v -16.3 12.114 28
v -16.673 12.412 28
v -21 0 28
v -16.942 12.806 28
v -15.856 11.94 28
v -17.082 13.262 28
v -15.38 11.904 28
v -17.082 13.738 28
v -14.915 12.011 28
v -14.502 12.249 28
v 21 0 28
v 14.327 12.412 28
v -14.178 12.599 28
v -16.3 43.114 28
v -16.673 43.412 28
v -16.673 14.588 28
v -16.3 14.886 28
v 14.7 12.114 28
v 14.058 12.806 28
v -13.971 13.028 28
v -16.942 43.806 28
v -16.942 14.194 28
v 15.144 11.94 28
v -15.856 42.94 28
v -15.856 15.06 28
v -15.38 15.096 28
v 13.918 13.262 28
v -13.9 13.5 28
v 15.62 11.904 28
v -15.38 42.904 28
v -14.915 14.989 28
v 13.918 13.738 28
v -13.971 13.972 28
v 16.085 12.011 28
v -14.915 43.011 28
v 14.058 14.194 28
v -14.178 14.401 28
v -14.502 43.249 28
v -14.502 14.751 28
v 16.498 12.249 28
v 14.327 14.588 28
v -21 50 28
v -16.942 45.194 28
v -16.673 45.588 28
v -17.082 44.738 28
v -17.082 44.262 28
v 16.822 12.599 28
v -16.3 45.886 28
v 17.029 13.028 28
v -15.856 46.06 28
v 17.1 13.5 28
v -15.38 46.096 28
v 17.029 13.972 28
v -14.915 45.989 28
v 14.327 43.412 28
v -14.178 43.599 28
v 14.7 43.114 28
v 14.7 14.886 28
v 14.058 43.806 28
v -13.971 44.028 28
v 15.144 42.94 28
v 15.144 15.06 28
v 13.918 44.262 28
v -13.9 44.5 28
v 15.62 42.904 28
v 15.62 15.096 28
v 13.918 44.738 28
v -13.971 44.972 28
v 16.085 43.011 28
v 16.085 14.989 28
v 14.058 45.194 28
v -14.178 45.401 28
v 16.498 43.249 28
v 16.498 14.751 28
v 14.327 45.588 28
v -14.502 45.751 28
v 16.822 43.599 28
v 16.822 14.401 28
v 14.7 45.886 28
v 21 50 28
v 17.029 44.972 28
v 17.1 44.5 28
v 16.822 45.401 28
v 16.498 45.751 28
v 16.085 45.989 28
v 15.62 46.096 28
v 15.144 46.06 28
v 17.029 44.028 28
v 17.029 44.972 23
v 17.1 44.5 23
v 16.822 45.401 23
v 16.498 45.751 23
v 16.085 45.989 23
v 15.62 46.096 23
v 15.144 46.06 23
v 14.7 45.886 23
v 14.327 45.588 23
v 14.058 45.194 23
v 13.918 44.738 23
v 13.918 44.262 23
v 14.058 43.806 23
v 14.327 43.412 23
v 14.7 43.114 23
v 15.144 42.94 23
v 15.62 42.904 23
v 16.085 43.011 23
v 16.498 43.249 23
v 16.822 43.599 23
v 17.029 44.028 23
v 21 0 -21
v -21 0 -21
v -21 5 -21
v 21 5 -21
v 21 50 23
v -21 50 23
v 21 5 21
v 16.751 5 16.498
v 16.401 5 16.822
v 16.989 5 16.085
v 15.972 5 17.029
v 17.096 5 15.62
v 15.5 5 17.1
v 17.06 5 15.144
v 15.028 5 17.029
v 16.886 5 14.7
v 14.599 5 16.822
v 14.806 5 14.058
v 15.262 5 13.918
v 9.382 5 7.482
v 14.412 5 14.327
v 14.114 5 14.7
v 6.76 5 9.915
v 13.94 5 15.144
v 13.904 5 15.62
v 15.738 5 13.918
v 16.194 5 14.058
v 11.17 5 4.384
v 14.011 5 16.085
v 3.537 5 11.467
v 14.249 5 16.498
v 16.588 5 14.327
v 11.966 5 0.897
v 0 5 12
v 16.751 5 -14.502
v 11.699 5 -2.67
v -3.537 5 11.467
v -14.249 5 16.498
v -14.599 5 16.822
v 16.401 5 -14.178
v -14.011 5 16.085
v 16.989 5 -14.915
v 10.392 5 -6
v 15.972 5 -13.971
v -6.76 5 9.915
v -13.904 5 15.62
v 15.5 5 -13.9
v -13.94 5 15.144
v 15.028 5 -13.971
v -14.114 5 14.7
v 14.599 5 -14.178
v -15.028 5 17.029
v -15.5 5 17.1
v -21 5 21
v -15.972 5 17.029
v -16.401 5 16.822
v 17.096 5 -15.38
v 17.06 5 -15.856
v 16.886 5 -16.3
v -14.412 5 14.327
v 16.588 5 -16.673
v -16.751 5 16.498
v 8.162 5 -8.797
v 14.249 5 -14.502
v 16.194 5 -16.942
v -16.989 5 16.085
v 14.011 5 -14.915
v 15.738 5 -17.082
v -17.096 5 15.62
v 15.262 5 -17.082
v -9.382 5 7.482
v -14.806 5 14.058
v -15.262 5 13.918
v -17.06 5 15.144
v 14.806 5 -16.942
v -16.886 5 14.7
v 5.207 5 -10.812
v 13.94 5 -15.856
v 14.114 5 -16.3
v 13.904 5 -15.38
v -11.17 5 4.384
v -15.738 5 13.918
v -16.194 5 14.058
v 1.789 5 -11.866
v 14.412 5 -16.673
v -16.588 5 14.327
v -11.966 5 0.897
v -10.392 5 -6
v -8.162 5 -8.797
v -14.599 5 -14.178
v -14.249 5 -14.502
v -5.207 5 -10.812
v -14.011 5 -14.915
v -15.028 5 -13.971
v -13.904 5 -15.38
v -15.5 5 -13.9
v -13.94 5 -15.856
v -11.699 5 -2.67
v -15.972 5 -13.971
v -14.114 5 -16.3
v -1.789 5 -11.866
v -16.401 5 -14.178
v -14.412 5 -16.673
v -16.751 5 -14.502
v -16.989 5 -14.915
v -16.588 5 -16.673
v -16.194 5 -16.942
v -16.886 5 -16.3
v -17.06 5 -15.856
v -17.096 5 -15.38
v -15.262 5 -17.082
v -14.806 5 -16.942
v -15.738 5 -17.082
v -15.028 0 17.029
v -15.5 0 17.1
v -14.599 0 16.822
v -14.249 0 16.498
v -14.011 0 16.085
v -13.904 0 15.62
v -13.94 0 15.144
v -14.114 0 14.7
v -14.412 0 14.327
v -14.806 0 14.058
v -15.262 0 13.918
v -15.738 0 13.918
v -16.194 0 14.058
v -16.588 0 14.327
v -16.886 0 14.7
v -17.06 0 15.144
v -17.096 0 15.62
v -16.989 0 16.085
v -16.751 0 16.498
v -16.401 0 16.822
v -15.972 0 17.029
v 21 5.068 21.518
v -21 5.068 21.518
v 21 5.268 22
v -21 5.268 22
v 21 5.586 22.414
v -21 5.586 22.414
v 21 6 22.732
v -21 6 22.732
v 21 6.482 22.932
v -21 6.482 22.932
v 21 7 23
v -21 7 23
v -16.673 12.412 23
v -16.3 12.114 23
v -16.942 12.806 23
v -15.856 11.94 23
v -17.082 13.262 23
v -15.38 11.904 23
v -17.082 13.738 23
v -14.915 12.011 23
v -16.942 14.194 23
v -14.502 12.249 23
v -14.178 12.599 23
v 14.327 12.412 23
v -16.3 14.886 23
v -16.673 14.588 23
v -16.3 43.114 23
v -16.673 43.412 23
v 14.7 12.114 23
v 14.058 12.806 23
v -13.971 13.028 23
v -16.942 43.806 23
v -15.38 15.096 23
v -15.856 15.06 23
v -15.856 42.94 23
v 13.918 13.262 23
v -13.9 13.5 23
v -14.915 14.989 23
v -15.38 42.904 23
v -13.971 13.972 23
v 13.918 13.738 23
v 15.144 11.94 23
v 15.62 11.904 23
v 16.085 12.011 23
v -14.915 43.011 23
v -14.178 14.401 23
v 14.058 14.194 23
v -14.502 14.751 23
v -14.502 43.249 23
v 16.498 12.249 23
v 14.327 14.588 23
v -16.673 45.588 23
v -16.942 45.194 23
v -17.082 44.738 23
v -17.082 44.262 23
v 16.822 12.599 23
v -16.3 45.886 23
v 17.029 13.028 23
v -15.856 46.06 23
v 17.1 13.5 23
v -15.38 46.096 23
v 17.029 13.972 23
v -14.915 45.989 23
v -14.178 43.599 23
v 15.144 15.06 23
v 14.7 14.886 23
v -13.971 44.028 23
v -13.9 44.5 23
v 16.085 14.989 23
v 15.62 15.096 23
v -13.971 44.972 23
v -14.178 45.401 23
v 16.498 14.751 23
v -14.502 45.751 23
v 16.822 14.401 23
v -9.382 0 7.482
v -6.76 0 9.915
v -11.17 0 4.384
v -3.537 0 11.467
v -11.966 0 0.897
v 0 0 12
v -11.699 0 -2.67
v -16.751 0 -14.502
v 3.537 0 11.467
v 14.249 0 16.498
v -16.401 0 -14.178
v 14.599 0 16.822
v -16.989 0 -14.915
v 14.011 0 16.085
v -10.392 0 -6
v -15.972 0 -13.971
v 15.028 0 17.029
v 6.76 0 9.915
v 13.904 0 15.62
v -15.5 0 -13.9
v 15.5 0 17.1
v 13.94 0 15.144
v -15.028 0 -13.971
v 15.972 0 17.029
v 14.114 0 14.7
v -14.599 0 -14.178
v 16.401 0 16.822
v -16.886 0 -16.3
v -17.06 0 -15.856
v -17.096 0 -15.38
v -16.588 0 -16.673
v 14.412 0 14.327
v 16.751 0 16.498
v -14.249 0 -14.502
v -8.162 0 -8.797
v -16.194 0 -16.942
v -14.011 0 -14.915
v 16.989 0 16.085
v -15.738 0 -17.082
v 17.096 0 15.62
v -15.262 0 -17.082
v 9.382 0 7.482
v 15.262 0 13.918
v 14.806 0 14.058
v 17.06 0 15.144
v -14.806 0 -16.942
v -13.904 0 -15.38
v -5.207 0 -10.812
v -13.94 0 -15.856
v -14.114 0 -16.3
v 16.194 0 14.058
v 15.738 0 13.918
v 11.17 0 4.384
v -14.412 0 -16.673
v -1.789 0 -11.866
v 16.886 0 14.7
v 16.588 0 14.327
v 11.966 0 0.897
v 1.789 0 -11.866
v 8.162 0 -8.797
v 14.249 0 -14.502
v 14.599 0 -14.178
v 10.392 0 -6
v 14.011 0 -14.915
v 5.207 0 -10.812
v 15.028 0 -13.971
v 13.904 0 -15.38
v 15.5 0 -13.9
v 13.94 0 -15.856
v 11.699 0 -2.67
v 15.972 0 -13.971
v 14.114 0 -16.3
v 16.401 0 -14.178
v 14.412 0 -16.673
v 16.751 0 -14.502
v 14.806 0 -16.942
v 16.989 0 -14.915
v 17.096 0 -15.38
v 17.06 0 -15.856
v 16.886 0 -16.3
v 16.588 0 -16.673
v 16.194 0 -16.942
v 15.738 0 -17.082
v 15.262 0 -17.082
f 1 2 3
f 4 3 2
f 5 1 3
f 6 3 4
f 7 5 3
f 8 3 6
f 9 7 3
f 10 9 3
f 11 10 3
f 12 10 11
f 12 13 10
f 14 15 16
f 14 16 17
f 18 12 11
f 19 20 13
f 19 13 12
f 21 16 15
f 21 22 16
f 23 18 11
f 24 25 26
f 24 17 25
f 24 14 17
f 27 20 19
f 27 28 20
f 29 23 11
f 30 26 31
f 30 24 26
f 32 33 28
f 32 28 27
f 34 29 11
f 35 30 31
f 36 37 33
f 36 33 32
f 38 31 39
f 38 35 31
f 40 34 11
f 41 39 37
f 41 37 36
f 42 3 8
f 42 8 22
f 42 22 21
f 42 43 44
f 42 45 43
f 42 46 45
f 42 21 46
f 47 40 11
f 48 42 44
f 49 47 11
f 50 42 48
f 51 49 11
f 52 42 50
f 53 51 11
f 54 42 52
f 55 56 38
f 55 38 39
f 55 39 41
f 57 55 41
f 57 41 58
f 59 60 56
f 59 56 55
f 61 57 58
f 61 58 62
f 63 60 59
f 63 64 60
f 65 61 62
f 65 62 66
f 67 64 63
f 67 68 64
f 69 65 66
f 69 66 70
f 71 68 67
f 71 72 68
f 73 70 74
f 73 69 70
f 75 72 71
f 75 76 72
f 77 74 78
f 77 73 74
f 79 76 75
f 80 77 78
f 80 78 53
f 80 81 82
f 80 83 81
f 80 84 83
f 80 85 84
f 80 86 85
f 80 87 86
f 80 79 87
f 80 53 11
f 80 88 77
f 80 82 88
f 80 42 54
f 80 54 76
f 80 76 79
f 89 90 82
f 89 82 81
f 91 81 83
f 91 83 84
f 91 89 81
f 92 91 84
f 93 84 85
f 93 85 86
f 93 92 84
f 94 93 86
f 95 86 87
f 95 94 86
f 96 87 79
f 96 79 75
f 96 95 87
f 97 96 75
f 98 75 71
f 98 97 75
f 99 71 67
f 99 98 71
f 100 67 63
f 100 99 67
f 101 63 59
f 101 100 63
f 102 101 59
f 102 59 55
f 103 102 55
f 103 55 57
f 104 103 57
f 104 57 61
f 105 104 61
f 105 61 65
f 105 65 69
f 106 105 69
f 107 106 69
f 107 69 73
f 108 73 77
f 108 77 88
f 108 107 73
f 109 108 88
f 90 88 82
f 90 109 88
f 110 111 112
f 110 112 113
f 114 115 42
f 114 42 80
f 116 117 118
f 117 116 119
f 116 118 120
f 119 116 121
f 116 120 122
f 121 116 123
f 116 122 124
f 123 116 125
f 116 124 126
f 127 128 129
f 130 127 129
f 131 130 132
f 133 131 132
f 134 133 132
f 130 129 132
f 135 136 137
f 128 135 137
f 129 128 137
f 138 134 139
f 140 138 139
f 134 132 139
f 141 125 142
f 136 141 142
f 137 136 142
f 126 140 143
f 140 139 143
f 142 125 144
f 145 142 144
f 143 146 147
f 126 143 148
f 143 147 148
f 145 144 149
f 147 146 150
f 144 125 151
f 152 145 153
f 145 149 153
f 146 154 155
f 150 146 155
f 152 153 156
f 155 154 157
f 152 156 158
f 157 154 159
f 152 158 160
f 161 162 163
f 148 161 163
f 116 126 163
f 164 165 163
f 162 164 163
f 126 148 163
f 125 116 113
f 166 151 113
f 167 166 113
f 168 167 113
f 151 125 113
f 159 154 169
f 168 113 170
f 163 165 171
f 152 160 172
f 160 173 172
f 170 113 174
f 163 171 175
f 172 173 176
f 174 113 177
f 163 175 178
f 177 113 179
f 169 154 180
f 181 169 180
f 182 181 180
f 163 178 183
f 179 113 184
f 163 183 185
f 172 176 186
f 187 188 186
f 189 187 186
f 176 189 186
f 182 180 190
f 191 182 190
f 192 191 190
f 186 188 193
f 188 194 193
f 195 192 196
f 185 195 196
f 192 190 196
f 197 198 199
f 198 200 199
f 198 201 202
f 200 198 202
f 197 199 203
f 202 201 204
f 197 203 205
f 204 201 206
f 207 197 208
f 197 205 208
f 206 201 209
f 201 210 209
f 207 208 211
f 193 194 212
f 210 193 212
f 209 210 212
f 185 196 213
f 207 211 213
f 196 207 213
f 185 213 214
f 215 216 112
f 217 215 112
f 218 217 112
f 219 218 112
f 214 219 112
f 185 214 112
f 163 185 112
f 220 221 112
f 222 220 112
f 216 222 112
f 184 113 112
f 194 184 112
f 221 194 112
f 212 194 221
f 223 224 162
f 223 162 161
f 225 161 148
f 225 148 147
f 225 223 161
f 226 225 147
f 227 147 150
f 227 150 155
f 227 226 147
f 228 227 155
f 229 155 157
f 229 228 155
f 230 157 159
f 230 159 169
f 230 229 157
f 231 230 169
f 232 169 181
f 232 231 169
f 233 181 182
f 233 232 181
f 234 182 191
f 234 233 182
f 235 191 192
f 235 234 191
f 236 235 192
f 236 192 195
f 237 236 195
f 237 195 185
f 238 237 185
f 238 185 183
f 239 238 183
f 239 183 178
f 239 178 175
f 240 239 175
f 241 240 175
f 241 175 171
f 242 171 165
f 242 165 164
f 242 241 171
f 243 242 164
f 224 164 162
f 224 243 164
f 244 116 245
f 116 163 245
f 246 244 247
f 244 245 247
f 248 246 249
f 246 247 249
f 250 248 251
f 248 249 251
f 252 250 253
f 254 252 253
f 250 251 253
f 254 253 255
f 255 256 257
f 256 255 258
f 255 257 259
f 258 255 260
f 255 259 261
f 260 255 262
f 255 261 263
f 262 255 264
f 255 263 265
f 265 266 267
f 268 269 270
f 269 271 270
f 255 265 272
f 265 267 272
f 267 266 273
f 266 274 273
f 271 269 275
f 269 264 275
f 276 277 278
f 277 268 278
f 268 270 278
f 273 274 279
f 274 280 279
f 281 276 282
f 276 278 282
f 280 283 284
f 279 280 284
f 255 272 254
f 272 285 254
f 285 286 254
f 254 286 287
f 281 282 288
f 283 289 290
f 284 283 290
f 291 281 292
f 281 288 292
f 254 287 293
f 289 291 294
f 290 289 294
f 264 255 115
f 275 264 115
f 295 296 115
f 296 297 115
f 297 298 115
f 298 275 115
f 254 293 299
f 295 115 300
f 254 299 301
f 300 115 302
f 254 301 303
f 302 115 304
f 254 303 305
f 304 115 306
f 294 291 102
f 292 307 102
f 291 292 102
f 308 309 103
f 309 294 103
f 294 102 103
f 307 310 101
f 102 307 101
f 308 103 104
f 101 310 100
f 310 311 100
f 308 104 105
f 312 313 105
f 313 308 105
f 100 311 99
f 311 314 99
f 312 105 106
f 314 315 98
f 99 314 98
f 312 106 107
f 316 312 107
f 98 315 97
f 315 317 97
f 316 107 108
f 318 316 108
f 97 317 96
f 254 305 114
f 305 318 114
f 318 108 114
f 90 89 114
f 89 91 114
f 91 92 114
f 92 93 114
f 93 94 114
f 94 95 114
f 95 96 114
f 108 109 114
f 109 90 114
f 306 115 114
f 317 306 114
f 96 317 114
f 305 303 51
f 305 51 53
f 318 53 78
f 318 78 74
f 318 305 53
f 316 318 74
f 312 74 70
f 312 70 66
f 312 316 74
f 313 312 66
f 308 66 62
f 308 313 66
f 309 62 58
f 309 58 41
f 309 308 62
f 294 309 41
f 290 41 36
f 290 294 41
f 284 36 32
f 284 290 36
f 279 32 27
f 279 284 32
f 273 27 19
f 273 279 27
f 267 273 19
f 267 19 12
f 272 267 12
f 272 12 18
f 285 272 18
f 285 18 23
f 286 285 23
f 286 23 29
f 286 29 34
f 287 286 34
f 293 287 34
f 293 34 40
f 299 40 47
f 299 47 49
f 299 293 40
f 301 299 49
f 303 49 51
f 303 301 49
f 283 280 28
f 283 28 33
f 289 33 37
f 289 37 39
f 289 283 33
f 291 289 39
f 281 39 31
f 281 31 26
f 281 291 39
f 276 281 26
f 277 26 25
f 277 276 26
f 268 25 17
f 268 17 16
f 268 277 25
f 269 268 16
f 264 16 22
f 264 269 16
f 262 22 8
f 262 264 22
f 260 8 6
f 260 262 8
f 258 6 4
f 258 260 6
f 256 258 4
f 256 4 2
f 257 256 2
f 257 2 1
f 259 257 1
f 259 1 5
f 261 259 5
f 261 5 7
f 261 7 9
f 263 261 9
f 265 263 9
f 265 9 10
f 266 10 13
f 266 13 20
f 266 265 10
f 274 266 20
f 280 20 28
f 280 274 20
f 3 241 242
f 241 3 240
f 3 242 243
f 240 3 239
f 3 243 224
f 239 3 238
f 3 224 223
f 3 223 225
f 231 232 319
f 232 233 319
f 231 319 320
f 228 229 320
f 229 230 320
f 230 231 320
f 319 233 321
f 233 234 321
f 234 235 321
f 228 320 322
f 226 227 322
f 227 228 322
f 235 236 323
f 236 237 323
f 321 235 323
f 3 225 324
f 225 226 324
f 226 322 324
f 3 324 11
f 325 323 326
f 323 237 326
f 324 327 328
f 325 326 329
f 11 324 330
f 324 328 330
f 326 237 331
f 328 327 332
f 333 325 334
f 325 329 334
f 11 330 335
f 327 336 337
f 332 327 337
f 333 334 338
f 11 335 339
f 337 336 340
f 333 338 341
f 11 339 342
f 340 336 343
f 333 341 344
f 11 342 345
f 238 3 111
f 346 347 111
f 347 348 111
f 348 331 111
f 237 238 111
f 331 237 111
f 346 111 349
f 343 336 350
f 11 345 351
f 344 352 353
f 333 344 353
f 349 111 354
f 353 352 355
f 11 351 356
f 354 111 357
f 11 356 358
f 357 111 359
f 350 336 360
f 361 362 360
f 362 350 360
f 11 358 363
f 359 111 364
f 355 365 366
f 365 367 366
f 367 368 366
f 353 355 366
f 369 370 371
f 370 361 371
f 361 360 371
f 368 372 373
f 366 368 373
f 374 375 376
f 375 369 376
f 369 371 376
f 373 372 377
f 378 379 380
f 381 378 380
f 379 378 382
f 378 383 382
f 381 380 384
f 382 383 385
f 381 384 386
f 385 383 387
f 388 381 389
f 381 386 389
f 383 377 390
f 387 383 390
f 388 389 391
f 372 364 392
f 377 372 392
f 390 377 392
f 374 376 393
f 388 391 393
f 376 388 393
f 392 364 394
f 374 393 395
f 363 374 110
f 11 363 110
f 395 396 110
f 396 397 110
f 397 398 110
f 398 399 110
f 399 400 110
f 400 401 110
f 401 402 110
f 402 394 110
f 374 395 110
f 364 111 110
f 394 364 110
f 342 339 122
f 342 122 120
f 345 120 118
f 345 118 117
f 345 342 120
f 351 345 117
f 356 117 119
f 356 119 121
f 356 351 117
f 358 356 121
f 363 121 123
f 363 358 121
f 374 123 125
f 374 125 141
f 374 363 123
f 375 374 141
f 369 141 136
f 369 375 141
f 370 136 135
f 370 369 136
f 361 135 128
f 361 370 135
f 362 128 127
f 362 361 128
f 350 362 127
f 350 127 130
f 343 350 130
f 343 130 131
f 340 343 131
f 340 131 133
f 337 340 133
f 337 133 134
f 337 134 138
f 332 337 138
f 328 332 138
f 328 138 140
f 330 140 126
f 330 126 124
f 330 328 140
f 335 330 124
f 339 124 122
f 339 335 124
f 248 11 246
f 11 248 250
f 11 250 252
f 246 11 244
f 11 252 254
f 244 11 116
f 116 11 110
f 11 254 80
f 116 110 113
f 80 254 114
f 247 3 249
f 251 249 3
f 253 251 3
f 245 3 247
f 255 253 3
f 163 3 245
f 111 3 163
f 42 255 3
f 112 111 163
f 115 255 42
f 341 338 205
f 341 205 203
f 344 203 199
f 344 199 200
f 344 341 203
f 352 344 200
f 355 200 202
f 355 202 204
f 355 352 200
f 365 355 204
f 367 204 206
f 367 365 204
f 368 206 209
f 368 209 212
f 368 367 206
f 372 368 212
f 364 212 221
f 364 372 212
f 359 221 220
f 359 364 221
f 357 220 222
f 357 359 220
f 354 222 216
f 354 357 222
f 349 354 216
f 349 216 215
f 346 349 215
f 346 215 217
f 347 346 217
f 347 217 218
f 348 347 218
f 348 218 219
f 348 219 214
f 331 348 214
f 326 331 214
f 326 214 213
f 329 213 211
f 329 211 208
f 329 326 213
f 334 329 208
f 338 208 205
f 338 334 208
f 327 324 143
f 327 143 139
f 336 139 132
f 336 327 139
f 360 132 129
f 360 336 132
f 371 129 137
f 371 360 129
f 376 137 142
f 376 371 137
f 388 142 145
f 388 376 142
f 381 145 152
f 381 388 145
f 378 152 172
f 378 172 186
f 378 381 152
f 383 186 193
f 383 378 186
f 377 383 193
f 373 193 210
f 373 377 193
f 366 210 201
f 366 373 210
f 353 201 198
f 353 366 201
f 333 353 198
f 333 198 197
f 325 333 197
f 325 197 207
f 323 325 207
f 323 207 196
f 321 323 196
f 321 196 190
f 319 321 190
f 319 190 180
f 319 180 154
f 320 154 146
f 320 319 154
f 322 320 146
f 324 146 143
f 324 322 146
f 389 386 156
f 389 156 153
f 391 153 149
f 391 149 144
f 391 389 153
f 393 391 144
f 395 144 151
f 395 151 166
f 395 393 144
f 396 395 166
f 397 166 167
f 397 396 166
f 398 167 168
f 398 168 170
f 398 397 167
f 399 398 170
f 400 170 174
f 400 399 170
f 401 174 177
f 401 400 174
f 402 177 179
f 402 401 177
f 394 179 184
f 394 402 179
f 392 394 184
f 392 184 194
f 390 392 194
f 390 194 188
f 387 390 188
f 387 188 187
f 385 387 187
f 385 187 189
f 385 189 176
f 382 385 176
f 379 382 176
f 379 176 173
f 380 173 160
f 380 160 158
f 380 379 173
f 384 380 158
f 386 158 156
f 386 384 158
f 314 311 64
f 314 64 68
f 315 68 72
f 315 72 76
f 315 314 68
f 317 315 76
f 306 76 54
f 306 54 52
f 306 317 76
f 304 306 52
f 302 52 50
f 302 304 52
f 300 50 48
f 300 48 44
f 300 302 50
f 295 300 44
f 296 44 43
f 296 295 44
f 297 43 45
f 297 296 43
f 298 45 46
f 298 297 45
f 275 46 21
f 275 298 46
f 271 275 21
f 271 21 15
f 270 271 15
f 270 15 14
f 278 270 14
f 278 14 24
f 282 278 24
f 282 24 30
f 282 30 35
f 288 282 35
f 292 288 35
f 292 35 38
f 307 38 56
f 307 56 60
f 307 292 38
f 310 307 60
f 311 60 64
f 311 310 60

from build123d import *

# Parameters (mm, degrees)
SKETCH_1_R      = 1.6
SKETCH_1_R_2    = 12
EXTRUDE_1_DEPTH = 5
SKETCH_4_W      = 42
SKETCH_4_H      = 50
SKETCH_4_R      = 1.6
EXTRUDE_4_DEPTH = 5
FILLET_1_R      = 2


with BuildPart() as part:
    # 草图1 → 凸台-拉伸1 (new body)
    with BuildSketch(Plane(origin=(0, 0, 0), x_dir=(1, 0, 0), z_dir=(0, 1, 0))):
        Polygon((-21, -21), (-21, 21), (21, 21), (21, -21), (21, -23), (-21, -23), align=None)
        with Locations(Location((-15.5, 15.5, 0), (0, 0, 270))):
            Circle(SKETCH_1_R, mode=Mode.SUBTRACT)
        with Locations(Location((15.5, 15.5, 0), (0, 0, 270))):
            Circle(SKETCH_1_R, mode=Mode.SUBTRACT)
        with Locations(Location((-15.5, -15.5, 0), (0, 0, 270))):
            Circle(SKETCH_1_R, mode=Mode.SUBTRACT)
        with Locations(Location((15.5, -15.5, 0), (0, 0, 270))):
            Circle(SKETCH_1_R, mode=Mode.SUBTRACT)
        with Locations(Location((0, 0, 0), (0, 0, 270))):
            Circle(SKETCH_1_R_2, mode=Mode.SUBTRACT)
    extrude(amount=EXTRUDE_1_DEPTH)

    # 草图4 → 凸台-拉伸4 (add)
    with BuildSketch(Plane.XY.offset(23)):
        with Locations((0, 25)):
            Rectangle(SKETCH_4_W, SKETCH_4_H)
        with Locations((-15.5, 44.5)):
            Circle(SKETCH_4_R, mode=Mode.SUBTRACT)
        with Locations((15.5, 44.5)):
            Circle(SKETCH_4_R, mode=Mode.SUBTRACT)
        with Locations((-15.5, 13.5)):
            Circle(SKETCH_4_R, mode=Mode.SUBTRACT)
        with Locations((15.5, 13.5)):
            Circle(SKETCH_4_R, mode=Mode.SUBTRACT)
    extrude(amount=EXTRUDE_4_DEPTH)

    # 圆角1
    fillet_1_edges = [part.edges().sort_by_distance(p)[0] for p in [
        (0, 5, 23),
    ]]
    fillet(fillet_1_edges, radius=FILLET_1_R)


solid = part.part
